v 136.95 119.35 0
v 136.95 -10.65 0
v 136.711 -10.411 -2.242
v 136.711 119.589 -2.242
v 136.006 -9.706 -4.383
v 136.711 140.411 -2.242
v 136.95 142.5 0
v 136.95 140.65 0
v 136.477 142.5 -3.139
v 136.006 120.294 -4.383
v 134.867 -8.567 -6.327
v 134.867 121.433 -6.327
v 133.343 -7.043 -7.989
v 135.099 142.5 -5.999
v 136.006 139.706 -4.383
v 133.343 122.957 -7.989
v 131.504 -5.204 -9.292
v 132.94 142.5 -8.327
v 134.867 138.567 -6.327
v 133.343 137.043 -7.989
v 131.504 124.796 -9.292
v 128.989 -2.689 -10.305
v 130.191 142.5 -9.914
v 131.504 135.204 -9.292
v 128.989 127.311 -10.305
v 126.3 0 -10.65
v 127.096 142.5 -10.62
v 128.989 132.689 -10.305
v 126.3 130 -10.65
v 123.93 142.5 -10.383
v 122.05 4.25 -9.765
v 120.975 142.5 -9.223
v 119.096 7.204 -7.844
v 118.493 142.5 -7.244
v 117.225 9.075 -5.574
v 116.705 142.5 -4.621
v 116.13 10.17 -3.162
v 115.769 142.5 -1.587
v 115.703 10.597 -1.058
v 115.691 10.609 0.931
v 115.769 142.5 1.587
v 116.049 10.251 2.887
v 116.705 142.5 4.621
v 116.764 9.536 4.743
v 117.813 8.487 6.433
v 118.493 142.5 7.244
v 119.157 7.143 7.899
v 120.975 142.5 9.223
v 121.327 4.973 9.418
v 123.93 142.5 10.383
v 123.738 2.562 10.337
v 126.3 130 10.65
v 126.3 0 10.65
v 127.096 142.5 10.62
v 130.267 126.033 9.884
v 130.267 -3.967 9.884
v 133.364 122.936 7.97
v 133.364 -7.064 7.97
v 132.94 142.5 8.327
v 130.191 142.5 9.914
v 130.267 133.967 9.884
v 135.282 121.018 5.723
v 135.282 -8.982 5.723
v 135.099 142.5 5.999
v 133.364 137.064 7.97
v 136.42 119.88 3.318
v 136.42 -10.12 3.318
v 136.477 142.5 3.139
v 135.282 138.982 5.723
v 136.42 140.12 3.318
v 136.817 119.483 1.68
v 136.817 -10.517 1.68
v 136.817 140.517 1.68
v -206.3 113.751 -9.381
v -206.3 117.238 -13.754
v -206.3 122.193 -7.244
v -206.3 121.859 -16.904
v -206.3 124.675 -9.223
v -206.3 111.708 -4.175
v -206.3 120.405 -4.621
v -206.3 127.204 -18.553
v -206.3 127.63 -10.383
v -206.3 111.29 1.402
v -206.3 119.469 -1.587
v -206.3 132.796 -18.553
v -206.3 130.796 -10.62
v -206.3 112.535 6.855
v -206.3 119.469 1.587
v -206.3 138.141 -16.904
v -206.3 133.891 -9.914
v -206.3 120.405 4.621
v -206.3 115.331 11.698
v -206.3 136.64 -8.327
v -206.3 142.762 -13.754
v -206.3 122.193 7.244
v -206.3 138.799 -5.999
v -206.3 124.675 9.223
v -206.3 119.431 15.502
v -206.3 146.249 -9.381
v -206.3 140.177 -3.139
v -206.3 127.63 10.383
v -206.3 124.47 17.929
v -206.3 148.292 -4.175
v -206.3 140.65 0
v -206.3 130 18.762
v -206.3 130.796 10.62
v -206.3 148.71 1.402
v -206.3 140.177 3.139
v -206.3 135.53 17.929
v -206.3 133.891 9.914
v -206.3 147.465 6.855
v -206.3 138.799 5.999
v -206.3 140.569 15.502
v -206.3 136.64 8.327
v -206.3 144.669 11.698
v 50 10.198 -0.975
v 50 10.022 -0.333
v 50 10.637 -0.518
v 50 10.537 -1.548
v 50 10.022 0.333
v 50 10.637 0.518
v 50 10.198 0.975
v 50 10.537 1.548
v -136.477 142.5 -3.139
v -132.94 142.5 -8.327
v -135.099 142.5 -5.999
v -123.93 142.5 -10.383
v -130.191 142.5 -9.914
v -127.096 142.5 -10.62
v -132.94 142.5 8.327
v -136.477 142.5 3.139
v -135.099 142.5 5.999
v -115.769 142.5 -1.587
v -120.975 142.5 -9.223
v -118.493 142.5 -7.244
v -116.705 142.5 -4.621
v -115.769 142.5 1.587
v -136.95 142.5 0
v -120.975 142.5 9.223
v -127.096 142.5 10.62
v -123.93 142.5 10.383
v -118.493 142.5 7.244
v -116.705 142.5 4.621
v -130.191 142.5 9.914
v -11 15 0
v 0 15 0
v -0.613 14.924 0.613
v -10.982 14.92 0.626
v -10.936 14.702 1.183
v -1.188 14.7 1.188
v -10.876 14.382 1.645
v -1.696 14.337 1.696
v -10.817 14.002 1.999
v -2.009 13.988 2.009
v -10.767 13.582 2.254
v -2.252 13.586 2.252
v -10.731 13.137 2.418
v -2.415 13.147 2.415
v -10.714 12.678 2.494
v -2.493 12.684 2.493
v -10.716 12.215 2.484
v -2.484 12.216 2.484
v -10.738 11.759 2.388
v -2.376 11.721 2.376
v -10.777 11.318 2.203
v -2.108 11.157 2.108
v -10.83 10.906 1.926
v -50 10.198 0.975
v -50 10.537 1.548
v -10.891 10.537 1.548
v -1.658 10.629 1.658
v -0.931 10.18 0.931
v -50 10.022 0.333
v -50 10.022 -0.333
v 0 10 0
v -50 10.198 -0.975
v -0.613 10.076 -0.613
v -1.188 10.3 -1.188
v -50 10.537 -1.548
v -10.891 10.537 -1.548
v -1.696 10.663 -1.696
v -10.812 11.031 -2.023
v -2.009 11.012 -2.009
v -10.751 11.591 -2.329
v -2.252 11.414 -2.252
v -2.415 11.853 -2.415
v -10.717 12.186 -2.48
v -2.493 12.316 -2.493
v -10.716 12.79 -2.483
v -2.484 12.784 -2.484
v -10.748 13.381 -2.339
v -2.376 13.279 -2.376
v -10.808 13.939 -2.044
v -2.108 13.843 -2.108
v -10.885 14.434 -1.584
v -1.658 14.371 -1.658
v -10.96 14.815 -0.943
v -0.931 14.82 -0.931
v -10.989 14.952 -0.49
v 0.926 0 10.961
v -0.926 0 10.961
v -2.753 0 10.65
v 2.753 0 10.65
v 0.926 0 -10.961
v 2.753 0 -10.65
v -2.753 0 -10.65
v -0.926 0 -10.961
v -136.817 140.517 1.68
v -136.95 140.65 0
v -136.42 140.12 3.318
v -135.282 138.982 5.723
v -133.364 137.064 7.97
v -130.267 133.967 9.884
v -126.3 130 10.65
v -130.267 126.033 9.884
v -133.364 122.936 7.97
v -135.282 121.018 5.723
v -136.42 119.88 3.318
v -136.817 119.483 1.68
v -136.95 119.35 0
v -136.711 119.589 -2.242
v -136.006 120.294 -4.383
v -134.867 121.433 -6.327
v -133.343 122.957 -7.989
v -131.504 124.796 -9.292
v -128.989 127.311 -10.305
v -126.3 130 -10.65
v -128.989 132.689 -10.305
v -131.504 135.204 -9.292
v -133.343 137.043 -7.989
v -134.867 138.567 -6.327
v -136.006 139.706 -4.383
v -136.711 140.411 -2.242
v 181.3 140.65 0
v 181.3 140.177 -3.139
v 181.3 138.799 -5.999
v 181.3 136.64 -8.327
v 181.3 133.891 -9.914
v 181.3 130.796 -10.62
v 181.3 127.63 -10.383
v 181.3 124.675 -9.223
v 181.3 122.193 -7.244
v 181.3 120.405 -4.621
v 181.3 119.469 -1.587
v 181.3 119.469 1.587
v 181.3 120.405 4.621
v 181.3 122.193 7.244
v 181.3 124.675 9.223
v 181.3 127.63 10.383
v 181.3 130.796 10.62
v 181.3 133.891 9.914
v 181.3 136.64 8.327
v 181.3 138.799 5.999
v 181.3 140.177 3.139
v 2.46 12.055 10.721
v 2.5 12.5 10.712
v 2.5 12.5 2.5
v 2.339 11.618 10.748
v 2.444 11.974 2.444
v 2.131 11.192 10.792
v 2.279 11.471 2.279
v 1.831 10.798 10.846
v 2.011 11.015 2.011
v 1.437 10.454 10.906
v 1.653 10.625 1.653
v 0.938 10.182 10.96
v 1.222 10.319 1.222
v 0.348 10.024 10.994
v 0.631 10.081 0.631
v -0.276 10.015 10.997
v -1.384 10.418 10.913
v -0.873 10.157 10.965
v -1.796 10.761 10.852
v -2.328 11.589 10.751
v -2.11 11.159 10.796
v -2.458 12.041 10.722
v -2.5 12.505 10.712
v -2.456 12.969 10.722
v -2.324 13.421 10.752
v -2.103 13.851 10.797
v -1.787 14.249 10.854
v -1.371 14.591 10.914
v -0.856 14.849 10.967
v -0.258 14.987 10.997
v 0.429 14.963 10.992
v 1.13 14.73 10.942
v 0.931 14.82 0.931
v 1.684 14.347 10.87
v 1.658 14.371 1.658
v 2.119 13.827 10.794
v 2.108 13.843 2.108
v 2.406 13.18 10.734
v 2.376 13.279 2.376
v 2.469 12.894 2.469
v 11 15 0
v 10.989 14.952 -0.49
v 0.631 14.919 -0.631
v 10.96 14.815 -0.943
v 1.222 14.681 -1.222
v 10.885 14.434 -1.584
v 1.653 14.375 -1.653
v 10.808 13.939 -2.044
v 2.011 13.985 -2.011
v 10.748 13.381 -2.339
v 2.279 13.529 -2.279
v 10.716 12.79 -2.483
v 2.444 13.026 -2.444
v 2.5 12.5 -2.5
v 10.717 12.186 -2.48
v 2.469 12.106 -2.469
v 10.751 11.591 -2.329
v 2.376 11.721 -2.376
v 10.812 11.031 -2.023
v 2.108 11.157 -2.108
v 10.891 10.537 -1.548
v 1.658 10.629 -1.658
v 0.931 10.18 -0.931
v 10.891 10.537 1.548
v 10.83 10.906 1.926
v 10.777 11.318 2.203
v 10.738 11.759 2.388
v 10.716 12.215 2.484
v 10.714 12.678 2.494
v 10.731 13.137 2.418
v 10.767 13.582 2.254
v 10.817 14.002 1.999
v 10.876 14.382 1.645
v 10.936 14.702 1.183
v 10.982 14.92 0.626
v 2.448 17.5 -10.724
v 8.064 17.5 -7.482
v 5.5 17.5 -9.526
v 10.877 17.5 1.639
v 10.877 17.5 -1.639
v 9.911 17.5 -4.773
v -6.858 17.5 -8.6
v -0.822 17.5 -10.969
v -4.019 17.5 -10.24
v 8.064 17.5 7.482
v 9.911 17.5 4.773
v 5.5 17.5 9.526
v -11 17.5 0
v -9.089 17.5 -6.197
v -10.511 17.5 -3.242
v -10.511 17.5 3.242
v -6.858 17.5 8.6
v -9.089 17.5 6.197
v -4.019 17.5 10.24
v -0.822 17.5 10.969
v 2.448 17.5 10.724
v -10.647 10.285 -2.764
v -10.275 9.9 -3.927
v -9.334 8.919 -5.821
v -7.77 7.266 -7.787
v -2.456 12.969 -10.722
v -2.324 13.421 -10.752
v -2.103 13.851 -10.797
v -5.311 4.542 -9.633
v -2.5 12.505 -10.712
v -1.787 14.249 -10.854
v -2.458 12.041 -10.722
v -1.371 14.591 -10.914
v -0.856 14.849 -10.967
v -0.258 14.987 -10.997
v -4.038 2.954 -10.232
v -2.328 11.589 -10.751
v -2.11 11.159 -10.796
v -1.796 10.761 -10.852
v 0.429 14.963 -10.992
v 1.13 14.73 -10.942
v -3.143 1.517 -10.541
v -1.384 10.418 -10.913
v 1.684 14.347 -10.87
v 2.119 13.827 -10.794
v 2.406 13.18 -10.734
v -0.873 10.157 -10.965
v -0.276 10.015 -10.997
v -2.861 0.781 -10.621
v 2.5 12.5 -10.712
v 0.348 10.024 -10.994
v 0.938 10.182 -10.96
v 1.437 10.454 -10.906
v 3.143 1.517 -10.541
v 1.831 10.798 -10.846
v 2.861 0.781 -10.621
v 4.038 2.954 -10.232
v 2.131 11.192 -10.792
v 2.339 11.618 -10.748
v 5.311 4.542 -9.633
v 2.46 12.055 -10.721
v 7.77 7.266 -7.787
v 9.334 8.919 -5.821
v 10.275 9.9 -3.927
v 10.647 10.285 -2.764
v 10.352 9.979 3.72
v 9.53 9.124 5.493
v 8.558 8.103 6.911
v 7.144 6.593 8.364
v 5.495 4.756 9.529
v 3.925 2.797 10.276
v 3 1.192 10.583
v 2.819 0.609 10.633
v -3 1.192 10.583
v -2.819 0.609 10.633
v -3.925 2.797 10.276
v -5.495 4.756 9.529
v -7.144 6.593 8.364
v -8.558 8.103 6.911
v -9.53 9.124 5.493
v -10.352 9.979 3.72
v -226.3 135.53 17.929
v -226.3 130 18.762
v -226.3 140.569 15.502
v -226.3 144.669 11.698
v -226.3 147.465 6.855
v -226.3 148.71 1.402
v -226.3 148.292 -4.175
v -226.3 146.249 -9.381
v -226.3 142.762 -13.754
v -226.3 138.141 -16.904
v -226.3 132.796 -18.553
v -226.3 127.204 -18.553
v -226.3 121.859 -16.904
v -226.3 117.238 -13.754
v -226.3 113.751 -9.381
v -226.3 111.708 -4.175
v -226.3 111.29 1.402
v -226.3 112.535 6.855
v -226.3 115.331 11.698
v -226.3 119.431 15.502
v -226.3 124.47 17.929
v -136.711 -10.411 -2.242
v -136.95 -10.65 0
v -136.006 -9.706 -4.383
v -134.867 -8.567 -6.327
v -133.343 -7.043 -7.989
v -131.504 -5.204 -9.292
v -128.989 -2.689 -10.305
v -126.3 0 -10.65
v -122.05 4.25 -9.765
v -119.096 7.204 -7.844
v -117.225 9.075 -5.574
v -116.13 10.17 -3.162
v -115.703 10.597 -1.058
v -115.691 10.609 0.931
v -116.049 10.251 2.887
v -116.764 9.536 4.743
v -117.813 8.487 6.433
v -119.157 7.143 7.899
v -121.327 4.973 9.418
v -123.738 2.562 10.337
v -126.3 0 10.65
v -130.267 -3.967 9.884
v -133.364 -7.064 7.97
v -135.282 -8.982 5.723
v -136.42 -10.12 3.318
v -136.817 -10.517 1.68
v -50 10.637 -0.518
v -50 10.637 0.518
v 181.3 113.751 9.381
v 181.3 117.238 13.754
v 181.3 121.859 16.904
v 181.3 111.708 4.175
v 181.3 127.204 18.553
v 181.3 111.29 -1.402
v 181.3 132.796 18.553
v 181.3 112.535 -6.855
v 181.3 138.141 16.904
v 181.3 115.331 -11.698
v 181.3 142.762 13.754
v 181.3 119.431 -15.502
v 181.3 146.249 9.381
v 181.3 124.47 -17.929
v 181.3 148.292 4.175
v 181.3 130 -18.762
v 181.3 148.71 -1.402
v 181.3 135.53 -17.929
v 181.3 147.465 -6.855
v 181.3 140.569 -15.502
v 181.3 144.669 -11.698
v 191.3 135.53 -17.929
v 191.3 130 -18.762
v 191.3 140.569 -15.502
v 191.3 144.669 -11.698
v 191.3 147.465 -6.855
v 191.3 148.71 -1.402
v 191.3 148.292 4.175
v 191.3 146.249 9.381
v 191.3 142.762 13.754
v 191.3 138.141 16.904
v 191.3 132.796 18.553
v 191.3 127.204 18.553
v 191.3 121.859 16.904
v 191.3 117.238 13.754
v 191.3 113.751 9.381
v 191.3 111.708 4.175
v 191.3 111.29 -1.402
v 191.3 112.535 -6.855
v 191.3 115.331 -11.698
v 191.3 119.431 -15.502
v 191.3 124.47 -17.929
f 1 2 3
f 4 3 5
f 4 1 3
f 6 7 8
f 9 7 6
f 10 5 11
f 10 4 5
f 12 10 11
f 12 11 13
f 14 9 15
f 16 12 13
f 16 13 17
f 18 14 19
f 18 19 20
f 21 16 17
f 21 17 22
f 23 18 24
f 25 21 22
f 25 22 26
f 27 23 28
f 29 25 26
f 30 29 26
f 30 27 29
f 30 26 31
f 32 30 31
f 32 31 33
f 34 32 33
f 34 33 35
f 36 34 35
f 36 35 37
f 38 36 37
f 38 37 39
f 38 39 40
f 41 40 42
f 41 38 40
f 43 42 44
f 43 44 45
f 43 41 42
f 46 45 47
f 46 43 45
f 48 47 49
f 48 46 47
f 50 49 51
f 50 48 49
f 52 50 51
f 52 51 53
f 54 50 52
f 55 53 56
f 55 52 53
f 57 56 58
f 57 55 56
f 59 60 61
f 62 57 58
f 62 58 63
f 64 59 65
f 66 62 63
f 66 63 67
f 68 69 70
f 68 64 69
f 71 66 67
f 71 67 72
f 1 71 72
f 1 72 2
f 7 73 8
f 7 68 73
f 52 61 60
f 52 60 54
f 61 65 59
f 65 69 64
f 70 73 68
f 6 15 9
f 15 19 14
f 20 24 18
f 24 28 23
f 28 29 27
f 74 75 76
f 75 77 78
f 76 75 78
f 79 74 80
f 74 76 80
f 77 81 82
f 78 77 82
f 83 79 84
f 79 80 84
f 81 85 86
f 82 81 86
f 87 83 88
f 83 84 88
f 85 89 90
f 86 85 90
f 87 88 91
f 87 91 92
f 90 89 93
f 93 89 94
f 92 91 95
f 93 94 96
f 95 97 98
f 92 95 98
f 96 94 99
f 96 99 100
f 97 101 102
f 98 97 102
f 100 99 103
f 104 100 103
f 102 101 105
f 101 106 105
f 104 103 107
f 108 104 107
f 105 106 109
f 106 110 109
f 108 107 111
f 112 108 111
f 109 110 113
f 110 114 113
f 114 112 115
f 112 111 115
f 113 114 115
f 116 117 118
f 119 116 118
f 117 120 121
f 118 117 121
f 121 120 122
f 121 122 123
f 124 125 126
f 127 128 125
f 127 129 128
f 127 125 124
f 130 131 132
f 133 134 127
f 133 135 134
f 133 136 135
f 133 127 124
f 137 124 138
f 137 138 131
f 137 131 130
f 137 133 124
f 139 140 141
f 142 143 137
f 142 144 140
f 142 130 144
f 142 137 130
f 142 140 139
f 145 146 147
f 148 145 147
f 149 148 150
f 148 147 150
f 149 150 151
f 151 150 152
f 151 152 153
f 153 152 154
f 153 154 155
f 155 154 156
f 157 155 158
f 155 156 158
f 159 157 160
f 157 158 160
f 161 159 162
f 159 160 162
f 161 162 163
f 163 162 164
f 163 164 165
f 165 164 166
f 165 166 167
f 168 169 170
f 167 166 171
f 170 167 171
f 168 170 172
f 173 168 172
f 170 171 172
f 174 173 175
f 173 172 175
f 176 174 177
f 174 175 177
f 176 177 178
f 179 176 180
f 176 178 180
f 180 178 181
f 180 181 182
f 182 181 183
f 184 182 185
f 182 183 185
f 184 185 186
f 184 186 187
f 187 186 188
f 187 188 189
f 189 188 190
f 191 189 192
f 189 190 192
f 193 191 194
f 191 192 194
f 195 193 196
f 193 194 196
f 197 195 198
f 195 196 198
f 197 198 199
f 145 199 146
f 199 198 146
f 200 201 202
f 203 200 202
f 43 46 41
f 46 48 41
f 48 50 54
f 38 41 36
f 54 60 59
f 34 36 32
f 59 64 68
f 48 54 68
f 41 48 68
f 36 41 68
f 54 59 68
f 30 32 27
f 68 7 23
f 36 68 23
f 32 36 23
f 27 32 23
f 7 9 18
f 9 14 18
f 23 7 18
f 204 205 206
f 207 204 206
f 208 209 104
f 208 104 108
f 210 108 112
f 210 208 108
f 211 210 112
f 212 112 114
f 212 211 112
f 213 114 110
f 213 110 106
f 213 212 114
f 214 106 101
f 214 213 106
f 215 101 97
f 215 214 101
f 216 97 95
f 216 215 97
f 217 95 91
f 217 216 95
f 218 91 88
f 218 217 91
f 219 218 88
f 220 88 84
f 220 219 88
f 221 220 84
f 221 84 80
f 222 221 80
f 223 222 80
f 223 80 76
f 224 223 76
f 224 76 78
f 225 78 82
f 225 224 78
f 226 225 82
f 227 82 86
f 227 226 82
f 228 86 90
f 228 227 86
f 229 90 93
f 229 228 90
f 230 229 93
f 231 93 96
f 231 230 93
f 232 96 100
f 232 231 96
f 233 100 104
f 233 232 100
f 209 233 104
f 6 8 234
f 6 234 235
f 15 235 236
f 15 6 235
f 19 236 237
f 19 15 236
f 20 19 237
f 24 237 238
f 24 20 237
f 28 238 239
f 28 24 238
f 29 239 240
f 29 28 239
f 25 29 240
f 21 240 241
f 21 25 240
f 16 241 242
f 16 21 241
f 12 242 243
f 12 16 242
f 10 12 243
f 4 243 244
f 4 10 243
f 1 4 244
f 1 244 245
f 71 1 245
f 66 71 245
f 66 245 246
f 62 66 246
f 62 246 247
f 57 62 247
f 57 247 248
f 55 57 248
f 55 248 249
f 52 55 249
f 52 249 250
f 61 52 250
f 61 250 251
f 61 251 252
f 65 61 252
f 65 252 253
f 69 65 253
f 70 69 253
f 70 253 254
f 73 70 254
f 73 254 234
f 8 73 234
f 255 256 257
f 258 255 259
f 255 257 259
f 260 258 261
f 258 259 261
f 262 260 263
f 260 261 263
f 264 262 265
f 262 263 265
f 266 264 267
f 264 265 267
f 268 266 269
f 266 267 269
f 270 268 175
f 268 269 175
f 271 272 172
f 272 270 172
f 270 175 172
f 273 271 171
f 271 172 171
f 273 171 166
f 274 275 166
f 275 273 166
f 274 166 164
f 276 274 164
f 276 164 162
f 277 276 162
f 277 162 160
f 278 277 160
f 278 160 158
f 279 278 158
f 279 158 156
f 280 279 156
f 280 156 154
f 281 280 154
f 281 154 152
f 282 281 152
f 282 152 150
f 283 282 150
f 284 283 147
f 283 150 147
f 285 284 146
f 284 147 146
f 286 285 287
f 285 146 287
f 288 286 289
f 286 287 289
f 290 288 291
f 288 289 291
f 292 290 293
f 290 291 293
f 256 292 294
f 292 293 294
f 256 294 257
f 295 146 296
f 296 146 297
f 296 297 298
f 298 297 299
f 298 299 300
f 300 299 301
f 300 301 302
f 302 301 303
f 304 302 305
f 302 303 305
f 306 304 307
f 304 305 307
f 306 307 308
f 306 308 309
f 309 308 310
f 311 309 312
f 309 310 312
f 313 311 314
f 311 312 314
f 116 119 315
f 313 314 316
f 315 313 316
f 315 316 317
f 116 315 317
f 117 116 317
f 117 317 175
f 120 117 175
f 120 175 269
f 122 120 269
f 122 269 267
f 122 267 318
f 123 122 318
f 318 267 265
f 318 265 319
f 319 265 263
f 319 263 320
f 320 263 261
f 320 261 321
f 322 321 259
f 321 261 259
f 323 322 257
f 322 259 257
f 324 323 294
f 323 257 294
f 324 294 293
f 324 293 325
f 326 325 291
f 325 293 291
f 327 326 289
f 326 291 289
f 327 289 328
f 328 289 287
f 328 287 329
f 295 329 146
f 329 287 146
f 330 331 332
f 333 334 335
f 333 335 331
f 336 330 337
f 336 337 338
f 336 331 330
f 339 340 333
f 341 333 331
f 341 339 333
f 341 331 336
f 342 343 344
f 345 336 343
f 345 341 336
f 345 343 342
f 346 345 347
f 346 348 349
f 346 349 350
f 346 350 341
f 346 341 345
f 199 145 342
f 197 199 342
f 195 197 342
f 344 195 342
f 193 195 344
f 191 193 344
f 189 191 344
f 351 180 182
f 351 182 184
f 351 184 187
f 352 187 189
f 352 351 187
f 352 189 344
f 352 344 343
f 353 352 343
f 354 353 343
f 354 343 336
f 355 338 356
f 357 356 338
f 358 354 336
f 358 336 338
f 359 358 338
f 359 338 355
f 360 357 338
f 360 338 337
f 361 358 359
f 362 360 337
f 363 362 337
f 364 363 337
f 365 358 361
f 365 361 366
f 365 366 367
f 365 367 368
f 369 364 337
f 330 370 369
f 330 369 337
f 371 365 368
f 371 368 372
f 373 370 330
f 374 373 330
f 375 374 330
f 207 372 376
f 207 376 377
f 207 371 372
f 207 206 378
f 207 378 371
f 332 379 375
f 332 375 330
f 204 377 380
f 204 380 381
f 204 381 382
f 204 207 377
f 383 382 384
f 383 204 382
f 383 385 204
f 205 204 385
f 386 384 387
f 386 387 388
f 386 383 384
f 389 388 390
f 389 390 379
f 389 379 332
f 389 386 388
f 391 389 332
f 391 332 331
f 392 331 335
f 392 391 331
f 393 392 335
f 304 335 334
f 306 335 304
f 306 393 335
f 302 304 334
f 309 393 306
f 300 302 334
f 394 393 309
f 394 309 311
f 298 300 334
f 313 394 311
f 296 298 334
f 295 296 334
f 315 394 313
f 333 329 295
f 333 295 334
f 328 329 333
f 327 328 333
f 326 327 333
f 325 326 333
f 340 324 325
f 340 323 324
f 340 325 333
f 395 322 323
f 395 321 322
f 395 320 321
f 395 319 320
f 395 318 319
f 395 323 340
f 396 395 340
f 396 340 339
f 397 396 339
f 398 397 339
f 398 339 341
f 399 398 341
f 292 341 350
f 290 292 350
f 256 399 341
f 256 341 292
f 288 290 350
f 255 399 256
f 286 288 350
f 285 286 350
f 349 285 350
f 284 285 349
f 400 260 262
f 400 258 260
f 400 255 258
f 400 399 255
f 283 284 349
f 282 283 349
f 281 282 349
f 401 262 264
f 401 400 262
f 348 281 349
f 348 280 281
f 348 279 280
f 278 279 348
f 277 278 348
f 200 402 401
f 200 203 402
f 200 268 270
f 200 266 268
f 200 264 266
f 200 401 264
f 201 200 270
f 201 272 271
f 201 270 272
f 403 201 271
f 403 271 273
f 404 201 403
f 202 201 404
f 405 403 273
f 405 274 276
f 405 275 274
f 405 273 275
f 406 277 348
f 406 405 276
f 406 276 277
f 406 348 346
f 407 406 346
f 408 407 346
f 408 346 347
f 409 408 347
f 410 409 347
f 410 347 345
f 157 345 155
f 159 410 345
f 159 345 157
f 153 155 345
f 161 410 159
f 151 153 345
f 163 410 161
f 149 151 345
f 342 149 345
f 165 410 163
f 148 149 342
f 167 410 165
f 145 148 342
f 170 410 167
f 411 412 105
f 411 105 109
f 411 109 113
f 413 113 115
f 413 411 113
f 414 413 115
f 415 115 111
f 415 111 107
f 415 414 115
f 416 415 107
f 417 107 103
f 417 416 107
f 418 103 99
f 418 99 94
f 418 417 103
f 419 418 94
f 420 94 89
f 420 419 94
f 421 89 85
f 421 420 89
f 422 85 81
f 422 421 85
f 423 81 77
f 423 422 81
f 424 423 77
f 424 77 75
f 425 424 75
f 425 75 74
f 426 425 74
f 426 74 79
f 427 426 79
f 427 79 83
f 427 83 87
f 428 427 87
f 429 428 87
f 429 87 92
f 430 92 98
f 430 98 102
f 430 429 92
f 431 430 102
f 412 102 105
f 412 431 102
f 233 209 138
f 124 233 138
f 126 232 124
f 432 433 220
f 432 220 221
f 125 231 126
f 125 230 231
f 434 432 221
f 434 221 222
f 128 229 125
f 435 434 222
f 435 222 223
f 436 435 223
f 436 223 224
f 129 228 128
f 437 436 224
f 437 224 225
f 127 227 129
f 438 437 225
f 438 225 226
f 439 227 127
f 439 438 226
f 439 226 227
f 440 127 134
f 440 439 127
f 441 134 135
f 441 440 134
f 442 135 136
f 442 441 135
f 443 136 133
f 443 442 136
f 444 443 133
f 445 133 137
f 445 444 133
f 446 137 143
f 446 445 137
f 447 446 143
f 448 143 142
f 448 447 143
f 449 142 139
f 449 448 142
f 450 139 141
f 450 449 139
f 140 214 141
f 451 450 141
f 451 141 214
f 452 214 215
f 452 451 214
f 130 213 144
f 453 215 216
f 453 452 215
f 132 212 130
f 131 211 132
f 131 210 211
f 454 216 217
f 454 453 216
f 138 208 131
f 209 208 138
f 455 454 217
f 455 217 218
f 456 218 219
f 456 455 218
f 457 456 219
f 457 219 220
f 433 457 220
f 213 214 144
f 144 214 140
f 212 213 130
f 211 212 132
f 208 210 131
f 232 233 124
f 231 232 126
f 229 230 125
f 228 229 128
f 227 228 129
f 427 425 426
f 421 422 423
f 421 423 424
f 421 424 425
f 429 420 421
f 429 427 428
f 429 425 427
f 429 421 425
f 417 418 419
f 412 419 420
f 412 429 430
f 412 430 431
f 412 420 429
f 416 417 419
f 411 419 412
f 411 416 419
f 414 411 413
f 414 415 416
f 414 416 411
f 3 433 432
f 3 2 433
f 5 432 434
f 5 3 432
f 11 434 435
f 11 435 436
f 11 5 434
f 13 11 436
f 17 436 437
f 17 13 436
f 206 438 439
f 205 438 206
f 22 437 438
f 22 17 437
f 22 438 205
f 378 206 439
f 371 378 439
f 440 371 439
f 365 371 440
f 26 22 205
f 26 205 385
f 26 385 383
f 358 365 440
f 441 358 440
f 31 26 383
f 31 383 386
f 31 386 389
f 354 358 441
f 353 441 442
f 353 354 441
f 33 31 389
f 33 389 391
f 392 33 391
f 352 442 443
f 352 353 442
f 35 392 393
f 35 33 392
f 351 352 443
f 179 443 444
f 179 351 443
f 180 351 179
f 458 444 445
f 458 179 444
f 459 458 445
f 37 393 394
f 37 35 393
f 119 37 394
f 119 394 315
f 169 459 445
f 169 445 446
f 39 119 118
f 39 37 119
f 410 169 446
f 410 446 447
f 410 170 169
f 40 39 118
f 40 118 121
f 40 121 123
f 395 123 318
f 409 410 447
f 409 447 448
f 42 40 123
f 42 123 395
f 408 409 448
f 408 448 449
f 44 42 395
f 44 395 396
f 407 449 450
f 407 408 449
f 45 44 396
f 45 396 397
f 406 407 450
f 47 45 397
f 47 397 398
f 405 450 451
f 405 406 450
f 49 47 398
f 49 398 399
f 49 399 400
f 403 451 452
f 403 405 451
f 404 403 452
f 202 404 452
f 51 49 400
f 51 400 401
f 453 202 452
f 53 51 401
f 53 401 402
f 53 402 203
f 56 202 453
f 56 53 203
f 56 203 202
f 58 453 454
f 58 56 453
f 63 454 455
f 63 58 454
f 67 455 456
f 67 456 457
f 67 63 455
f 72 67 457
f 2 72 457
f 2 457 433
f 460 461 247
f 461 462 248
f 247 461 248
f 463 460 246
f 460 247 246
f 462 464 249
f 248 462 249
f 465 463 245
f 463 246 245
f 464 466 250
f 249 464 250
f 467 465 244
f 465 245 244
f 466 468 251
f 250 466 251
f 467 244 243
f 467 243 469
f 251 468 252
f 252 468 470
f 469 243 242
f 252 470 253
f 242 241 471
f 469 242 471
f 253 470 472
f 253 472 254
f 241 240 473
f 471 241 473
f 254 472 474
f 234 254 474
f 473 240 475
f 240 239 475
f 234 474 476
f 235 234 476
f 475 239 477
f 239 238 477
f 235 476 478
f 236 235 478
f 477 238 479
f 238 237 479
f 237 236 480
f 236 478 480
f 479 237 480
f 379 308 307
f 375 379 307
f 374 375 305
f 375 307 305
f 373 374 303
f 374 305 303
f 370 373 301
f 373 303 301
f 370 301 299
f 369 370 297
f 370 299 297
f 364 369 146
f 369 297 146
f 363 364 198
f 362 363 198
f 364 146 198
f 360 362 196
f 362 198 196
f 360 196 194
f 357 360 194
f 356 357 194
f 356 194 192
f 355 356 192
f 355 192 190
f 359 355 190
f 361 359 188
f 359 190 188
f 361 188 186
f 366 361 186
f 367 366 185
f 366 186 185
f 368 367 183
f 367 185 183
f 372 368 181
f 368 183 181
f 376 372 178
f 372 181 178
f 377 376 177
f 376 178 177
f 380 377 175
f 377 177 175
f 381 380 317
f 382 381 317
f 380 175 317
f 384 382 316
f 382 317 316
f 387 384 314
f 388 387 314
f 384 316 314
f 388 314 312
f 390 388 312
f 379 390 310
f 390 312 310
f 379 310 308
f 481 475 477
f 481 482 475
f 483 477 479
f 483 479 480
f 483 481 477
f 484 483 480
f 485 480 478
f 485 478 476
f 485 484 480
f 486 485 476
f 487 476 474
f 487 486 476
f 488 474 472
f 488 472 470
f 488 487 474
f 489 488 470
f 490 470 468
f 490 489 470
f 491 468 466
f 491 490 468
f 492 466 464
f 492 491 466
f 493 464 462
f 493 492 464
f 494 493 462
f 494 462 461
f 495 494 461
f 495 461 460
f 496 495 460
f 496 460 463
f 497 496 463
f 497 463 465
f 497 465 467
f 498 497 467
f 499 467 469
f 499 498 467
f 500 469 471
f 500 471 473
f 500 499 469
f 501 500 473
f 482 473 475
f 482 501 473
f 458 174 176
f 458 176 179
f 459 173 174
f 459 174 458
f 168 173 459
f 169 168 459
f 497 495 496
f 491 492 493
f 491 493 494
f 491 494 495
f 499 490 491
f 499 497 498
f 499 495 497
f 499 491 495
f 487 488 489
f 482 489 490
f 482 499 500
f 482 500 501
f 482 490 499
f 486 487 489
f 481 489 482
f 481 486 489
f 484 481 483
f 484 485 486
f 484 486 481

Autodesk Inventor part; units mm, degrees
sketch "Sketch1" plane through (0, 0, 0) normal (0, 0, 1) x (1, 0, 0)
  line L0 (-126.3, 0) -> (126.3, 0)
  line L1 (126.3, 0) -> (126.3, 142.5)
  line L2 (126.3, 0) -> (268.8, 0) construction
  line L3 (-126.3, 0) -> (-126.3, 142.5)
  point P0 (0, 0)
  dimension "d0" = 252.6
  dimension "d1" = 142.5
  dimension "d2" = 90
  dimension "d3" = 142.5
ref_plane "Work Plane1" through (-126.3, 142.5, 0) normal (0, 1, 0) x (-1, 0, 0)
sketch "Sketch2" plane through (-126.3, 142.5, 0) normal (0, 1, 0) x (-1, 0, 0)
  circle A0 centre (0, 0) radius 10.65
  point P0 (-126.3, 0)
  dimension "d4" = 21.3
sweep "Sweep1" add profiles "Sketch2" path "Sketch1"
ref_plane "Work Plane2" through (0, 0, 0) normal (0, 1, 0) x (-1, 0, 0)
sketch "Sketch3" plane through (0, 0, 0) normal (0, 1, 0) x (-1, 0, 0)
  circle A0 centre (0, 0) radius 11
  dimension "d8" = 22
extrude "Extrusion1" add sketch "Sketch3" along normal blind 17.5
ref_plane "Work Plane3" through (0, 0, 0) normal (0, 0, 1) x (1, 0, 0)
sketch "Sketch4" plane through (0, 0, 0) normal (0, 0, 1) x (1, 0, 0)
  circle A0 centre (0, 12.5) radius 2.5
  point P0 (0, 0)
  dimension "d12" = 5
extrude "Extrusion2" cut sketch "Sketch4" along normal mid plane 100
ref_plane "Work Plane4" through (0, 0, 0) normal (1, 0, 0) x (0, 1, 0)
sketch "Sketch5" plane through (0, 0, 0) normal (1, 0, 0) x (0, 1, 0)
  circle A0 centre (12.5, 0) radius 2.5
  point P0 (0, 0)
  dimension "d16" = 5
extrude "Extrusion3" cut sketch "Sketch5" along normal mid plane 100
sketch "Sketch6" plane through (-126.3, 142.5, 0) normal (0, 1, 0) x (1, 0, 0)
  circle A0 centre (0, 0) radius 10.65 projected
  point P0 (126.3, 0)
sketch "Sketch7" plane through (126.3, 142.5, 0) normal (0, 1, 0) x (1, 0, 0)
  circle A0 centre (0, 0) radius 10.65 projected
  point P0 (-126.3, 0)
ref_plane "Work Plane6" through (126.3, 0, 0) normal (1, 0, 0) x (0, 1, 0)
ref_plane "Work Plane7" through (-126.3, 0, 0) normal (1, 0, 0) x (0, 1, 0)
sketch "Sketch8" plane through (-126.3, 0, 0) normal (1, 0, 0) x (0, 1, 0)
  line L0 (142.5, -10.65) -> (142.5, 10.65) projected
  circle A0 centre (130, 0) radius 10.65
  point P0 (0, 0)
  point P1 (142.5, 0)
  dimension "d21" = 21.3
extrude "Extrusion4" add sketch "Sketch8" against normal blind 100
sketch "Sketch9" plane through (126.3, 0, 0) normal (1, 0, 0) x (0, 1, 0)
  circle A0 centre (130, 0) radius 10.65 projected
  circle A1 centre (130, 0) radius 10.65
  point P0 (0, 0)
extrude "Extrusion5" add sketch "Sketch9" along normal blind 100
sketch "Sketch10" plane through (-226.3, 130, 0) normal (-1, 0, 0) x (0, 0, 1)
  circle A0 centre (0, 0) radius 18.7623
  point P0 (0, -130)
extrude "Extrusion6" add sketch "Sketch10" against normal blind 20
sketch "Sketch11" plane through (226.3, 130, 0) normal (1, 0, 0) x (0, 0, -1)
  circle A0 centre (0, 0) radius 10.65 projected
  circle A1 centre (0, 0) radius 18.7623
  point P0 (0, -130)
extrude "Extrusion7" add sketch "Sketch11" against normal blind 45 contours A0 | A1
sketch "Sketch12" plane through (226.3, 130, 0) normal (1, 0, 0) x (0, 0, -1)
  circle A0 centre (0, 0) radius 18.7623
  point P0 (0, -130)
extrude "Extrusion8" cut sketch "Sketch12" against normal blind 35
properties part number "newhands" material "PVC-Piping"
